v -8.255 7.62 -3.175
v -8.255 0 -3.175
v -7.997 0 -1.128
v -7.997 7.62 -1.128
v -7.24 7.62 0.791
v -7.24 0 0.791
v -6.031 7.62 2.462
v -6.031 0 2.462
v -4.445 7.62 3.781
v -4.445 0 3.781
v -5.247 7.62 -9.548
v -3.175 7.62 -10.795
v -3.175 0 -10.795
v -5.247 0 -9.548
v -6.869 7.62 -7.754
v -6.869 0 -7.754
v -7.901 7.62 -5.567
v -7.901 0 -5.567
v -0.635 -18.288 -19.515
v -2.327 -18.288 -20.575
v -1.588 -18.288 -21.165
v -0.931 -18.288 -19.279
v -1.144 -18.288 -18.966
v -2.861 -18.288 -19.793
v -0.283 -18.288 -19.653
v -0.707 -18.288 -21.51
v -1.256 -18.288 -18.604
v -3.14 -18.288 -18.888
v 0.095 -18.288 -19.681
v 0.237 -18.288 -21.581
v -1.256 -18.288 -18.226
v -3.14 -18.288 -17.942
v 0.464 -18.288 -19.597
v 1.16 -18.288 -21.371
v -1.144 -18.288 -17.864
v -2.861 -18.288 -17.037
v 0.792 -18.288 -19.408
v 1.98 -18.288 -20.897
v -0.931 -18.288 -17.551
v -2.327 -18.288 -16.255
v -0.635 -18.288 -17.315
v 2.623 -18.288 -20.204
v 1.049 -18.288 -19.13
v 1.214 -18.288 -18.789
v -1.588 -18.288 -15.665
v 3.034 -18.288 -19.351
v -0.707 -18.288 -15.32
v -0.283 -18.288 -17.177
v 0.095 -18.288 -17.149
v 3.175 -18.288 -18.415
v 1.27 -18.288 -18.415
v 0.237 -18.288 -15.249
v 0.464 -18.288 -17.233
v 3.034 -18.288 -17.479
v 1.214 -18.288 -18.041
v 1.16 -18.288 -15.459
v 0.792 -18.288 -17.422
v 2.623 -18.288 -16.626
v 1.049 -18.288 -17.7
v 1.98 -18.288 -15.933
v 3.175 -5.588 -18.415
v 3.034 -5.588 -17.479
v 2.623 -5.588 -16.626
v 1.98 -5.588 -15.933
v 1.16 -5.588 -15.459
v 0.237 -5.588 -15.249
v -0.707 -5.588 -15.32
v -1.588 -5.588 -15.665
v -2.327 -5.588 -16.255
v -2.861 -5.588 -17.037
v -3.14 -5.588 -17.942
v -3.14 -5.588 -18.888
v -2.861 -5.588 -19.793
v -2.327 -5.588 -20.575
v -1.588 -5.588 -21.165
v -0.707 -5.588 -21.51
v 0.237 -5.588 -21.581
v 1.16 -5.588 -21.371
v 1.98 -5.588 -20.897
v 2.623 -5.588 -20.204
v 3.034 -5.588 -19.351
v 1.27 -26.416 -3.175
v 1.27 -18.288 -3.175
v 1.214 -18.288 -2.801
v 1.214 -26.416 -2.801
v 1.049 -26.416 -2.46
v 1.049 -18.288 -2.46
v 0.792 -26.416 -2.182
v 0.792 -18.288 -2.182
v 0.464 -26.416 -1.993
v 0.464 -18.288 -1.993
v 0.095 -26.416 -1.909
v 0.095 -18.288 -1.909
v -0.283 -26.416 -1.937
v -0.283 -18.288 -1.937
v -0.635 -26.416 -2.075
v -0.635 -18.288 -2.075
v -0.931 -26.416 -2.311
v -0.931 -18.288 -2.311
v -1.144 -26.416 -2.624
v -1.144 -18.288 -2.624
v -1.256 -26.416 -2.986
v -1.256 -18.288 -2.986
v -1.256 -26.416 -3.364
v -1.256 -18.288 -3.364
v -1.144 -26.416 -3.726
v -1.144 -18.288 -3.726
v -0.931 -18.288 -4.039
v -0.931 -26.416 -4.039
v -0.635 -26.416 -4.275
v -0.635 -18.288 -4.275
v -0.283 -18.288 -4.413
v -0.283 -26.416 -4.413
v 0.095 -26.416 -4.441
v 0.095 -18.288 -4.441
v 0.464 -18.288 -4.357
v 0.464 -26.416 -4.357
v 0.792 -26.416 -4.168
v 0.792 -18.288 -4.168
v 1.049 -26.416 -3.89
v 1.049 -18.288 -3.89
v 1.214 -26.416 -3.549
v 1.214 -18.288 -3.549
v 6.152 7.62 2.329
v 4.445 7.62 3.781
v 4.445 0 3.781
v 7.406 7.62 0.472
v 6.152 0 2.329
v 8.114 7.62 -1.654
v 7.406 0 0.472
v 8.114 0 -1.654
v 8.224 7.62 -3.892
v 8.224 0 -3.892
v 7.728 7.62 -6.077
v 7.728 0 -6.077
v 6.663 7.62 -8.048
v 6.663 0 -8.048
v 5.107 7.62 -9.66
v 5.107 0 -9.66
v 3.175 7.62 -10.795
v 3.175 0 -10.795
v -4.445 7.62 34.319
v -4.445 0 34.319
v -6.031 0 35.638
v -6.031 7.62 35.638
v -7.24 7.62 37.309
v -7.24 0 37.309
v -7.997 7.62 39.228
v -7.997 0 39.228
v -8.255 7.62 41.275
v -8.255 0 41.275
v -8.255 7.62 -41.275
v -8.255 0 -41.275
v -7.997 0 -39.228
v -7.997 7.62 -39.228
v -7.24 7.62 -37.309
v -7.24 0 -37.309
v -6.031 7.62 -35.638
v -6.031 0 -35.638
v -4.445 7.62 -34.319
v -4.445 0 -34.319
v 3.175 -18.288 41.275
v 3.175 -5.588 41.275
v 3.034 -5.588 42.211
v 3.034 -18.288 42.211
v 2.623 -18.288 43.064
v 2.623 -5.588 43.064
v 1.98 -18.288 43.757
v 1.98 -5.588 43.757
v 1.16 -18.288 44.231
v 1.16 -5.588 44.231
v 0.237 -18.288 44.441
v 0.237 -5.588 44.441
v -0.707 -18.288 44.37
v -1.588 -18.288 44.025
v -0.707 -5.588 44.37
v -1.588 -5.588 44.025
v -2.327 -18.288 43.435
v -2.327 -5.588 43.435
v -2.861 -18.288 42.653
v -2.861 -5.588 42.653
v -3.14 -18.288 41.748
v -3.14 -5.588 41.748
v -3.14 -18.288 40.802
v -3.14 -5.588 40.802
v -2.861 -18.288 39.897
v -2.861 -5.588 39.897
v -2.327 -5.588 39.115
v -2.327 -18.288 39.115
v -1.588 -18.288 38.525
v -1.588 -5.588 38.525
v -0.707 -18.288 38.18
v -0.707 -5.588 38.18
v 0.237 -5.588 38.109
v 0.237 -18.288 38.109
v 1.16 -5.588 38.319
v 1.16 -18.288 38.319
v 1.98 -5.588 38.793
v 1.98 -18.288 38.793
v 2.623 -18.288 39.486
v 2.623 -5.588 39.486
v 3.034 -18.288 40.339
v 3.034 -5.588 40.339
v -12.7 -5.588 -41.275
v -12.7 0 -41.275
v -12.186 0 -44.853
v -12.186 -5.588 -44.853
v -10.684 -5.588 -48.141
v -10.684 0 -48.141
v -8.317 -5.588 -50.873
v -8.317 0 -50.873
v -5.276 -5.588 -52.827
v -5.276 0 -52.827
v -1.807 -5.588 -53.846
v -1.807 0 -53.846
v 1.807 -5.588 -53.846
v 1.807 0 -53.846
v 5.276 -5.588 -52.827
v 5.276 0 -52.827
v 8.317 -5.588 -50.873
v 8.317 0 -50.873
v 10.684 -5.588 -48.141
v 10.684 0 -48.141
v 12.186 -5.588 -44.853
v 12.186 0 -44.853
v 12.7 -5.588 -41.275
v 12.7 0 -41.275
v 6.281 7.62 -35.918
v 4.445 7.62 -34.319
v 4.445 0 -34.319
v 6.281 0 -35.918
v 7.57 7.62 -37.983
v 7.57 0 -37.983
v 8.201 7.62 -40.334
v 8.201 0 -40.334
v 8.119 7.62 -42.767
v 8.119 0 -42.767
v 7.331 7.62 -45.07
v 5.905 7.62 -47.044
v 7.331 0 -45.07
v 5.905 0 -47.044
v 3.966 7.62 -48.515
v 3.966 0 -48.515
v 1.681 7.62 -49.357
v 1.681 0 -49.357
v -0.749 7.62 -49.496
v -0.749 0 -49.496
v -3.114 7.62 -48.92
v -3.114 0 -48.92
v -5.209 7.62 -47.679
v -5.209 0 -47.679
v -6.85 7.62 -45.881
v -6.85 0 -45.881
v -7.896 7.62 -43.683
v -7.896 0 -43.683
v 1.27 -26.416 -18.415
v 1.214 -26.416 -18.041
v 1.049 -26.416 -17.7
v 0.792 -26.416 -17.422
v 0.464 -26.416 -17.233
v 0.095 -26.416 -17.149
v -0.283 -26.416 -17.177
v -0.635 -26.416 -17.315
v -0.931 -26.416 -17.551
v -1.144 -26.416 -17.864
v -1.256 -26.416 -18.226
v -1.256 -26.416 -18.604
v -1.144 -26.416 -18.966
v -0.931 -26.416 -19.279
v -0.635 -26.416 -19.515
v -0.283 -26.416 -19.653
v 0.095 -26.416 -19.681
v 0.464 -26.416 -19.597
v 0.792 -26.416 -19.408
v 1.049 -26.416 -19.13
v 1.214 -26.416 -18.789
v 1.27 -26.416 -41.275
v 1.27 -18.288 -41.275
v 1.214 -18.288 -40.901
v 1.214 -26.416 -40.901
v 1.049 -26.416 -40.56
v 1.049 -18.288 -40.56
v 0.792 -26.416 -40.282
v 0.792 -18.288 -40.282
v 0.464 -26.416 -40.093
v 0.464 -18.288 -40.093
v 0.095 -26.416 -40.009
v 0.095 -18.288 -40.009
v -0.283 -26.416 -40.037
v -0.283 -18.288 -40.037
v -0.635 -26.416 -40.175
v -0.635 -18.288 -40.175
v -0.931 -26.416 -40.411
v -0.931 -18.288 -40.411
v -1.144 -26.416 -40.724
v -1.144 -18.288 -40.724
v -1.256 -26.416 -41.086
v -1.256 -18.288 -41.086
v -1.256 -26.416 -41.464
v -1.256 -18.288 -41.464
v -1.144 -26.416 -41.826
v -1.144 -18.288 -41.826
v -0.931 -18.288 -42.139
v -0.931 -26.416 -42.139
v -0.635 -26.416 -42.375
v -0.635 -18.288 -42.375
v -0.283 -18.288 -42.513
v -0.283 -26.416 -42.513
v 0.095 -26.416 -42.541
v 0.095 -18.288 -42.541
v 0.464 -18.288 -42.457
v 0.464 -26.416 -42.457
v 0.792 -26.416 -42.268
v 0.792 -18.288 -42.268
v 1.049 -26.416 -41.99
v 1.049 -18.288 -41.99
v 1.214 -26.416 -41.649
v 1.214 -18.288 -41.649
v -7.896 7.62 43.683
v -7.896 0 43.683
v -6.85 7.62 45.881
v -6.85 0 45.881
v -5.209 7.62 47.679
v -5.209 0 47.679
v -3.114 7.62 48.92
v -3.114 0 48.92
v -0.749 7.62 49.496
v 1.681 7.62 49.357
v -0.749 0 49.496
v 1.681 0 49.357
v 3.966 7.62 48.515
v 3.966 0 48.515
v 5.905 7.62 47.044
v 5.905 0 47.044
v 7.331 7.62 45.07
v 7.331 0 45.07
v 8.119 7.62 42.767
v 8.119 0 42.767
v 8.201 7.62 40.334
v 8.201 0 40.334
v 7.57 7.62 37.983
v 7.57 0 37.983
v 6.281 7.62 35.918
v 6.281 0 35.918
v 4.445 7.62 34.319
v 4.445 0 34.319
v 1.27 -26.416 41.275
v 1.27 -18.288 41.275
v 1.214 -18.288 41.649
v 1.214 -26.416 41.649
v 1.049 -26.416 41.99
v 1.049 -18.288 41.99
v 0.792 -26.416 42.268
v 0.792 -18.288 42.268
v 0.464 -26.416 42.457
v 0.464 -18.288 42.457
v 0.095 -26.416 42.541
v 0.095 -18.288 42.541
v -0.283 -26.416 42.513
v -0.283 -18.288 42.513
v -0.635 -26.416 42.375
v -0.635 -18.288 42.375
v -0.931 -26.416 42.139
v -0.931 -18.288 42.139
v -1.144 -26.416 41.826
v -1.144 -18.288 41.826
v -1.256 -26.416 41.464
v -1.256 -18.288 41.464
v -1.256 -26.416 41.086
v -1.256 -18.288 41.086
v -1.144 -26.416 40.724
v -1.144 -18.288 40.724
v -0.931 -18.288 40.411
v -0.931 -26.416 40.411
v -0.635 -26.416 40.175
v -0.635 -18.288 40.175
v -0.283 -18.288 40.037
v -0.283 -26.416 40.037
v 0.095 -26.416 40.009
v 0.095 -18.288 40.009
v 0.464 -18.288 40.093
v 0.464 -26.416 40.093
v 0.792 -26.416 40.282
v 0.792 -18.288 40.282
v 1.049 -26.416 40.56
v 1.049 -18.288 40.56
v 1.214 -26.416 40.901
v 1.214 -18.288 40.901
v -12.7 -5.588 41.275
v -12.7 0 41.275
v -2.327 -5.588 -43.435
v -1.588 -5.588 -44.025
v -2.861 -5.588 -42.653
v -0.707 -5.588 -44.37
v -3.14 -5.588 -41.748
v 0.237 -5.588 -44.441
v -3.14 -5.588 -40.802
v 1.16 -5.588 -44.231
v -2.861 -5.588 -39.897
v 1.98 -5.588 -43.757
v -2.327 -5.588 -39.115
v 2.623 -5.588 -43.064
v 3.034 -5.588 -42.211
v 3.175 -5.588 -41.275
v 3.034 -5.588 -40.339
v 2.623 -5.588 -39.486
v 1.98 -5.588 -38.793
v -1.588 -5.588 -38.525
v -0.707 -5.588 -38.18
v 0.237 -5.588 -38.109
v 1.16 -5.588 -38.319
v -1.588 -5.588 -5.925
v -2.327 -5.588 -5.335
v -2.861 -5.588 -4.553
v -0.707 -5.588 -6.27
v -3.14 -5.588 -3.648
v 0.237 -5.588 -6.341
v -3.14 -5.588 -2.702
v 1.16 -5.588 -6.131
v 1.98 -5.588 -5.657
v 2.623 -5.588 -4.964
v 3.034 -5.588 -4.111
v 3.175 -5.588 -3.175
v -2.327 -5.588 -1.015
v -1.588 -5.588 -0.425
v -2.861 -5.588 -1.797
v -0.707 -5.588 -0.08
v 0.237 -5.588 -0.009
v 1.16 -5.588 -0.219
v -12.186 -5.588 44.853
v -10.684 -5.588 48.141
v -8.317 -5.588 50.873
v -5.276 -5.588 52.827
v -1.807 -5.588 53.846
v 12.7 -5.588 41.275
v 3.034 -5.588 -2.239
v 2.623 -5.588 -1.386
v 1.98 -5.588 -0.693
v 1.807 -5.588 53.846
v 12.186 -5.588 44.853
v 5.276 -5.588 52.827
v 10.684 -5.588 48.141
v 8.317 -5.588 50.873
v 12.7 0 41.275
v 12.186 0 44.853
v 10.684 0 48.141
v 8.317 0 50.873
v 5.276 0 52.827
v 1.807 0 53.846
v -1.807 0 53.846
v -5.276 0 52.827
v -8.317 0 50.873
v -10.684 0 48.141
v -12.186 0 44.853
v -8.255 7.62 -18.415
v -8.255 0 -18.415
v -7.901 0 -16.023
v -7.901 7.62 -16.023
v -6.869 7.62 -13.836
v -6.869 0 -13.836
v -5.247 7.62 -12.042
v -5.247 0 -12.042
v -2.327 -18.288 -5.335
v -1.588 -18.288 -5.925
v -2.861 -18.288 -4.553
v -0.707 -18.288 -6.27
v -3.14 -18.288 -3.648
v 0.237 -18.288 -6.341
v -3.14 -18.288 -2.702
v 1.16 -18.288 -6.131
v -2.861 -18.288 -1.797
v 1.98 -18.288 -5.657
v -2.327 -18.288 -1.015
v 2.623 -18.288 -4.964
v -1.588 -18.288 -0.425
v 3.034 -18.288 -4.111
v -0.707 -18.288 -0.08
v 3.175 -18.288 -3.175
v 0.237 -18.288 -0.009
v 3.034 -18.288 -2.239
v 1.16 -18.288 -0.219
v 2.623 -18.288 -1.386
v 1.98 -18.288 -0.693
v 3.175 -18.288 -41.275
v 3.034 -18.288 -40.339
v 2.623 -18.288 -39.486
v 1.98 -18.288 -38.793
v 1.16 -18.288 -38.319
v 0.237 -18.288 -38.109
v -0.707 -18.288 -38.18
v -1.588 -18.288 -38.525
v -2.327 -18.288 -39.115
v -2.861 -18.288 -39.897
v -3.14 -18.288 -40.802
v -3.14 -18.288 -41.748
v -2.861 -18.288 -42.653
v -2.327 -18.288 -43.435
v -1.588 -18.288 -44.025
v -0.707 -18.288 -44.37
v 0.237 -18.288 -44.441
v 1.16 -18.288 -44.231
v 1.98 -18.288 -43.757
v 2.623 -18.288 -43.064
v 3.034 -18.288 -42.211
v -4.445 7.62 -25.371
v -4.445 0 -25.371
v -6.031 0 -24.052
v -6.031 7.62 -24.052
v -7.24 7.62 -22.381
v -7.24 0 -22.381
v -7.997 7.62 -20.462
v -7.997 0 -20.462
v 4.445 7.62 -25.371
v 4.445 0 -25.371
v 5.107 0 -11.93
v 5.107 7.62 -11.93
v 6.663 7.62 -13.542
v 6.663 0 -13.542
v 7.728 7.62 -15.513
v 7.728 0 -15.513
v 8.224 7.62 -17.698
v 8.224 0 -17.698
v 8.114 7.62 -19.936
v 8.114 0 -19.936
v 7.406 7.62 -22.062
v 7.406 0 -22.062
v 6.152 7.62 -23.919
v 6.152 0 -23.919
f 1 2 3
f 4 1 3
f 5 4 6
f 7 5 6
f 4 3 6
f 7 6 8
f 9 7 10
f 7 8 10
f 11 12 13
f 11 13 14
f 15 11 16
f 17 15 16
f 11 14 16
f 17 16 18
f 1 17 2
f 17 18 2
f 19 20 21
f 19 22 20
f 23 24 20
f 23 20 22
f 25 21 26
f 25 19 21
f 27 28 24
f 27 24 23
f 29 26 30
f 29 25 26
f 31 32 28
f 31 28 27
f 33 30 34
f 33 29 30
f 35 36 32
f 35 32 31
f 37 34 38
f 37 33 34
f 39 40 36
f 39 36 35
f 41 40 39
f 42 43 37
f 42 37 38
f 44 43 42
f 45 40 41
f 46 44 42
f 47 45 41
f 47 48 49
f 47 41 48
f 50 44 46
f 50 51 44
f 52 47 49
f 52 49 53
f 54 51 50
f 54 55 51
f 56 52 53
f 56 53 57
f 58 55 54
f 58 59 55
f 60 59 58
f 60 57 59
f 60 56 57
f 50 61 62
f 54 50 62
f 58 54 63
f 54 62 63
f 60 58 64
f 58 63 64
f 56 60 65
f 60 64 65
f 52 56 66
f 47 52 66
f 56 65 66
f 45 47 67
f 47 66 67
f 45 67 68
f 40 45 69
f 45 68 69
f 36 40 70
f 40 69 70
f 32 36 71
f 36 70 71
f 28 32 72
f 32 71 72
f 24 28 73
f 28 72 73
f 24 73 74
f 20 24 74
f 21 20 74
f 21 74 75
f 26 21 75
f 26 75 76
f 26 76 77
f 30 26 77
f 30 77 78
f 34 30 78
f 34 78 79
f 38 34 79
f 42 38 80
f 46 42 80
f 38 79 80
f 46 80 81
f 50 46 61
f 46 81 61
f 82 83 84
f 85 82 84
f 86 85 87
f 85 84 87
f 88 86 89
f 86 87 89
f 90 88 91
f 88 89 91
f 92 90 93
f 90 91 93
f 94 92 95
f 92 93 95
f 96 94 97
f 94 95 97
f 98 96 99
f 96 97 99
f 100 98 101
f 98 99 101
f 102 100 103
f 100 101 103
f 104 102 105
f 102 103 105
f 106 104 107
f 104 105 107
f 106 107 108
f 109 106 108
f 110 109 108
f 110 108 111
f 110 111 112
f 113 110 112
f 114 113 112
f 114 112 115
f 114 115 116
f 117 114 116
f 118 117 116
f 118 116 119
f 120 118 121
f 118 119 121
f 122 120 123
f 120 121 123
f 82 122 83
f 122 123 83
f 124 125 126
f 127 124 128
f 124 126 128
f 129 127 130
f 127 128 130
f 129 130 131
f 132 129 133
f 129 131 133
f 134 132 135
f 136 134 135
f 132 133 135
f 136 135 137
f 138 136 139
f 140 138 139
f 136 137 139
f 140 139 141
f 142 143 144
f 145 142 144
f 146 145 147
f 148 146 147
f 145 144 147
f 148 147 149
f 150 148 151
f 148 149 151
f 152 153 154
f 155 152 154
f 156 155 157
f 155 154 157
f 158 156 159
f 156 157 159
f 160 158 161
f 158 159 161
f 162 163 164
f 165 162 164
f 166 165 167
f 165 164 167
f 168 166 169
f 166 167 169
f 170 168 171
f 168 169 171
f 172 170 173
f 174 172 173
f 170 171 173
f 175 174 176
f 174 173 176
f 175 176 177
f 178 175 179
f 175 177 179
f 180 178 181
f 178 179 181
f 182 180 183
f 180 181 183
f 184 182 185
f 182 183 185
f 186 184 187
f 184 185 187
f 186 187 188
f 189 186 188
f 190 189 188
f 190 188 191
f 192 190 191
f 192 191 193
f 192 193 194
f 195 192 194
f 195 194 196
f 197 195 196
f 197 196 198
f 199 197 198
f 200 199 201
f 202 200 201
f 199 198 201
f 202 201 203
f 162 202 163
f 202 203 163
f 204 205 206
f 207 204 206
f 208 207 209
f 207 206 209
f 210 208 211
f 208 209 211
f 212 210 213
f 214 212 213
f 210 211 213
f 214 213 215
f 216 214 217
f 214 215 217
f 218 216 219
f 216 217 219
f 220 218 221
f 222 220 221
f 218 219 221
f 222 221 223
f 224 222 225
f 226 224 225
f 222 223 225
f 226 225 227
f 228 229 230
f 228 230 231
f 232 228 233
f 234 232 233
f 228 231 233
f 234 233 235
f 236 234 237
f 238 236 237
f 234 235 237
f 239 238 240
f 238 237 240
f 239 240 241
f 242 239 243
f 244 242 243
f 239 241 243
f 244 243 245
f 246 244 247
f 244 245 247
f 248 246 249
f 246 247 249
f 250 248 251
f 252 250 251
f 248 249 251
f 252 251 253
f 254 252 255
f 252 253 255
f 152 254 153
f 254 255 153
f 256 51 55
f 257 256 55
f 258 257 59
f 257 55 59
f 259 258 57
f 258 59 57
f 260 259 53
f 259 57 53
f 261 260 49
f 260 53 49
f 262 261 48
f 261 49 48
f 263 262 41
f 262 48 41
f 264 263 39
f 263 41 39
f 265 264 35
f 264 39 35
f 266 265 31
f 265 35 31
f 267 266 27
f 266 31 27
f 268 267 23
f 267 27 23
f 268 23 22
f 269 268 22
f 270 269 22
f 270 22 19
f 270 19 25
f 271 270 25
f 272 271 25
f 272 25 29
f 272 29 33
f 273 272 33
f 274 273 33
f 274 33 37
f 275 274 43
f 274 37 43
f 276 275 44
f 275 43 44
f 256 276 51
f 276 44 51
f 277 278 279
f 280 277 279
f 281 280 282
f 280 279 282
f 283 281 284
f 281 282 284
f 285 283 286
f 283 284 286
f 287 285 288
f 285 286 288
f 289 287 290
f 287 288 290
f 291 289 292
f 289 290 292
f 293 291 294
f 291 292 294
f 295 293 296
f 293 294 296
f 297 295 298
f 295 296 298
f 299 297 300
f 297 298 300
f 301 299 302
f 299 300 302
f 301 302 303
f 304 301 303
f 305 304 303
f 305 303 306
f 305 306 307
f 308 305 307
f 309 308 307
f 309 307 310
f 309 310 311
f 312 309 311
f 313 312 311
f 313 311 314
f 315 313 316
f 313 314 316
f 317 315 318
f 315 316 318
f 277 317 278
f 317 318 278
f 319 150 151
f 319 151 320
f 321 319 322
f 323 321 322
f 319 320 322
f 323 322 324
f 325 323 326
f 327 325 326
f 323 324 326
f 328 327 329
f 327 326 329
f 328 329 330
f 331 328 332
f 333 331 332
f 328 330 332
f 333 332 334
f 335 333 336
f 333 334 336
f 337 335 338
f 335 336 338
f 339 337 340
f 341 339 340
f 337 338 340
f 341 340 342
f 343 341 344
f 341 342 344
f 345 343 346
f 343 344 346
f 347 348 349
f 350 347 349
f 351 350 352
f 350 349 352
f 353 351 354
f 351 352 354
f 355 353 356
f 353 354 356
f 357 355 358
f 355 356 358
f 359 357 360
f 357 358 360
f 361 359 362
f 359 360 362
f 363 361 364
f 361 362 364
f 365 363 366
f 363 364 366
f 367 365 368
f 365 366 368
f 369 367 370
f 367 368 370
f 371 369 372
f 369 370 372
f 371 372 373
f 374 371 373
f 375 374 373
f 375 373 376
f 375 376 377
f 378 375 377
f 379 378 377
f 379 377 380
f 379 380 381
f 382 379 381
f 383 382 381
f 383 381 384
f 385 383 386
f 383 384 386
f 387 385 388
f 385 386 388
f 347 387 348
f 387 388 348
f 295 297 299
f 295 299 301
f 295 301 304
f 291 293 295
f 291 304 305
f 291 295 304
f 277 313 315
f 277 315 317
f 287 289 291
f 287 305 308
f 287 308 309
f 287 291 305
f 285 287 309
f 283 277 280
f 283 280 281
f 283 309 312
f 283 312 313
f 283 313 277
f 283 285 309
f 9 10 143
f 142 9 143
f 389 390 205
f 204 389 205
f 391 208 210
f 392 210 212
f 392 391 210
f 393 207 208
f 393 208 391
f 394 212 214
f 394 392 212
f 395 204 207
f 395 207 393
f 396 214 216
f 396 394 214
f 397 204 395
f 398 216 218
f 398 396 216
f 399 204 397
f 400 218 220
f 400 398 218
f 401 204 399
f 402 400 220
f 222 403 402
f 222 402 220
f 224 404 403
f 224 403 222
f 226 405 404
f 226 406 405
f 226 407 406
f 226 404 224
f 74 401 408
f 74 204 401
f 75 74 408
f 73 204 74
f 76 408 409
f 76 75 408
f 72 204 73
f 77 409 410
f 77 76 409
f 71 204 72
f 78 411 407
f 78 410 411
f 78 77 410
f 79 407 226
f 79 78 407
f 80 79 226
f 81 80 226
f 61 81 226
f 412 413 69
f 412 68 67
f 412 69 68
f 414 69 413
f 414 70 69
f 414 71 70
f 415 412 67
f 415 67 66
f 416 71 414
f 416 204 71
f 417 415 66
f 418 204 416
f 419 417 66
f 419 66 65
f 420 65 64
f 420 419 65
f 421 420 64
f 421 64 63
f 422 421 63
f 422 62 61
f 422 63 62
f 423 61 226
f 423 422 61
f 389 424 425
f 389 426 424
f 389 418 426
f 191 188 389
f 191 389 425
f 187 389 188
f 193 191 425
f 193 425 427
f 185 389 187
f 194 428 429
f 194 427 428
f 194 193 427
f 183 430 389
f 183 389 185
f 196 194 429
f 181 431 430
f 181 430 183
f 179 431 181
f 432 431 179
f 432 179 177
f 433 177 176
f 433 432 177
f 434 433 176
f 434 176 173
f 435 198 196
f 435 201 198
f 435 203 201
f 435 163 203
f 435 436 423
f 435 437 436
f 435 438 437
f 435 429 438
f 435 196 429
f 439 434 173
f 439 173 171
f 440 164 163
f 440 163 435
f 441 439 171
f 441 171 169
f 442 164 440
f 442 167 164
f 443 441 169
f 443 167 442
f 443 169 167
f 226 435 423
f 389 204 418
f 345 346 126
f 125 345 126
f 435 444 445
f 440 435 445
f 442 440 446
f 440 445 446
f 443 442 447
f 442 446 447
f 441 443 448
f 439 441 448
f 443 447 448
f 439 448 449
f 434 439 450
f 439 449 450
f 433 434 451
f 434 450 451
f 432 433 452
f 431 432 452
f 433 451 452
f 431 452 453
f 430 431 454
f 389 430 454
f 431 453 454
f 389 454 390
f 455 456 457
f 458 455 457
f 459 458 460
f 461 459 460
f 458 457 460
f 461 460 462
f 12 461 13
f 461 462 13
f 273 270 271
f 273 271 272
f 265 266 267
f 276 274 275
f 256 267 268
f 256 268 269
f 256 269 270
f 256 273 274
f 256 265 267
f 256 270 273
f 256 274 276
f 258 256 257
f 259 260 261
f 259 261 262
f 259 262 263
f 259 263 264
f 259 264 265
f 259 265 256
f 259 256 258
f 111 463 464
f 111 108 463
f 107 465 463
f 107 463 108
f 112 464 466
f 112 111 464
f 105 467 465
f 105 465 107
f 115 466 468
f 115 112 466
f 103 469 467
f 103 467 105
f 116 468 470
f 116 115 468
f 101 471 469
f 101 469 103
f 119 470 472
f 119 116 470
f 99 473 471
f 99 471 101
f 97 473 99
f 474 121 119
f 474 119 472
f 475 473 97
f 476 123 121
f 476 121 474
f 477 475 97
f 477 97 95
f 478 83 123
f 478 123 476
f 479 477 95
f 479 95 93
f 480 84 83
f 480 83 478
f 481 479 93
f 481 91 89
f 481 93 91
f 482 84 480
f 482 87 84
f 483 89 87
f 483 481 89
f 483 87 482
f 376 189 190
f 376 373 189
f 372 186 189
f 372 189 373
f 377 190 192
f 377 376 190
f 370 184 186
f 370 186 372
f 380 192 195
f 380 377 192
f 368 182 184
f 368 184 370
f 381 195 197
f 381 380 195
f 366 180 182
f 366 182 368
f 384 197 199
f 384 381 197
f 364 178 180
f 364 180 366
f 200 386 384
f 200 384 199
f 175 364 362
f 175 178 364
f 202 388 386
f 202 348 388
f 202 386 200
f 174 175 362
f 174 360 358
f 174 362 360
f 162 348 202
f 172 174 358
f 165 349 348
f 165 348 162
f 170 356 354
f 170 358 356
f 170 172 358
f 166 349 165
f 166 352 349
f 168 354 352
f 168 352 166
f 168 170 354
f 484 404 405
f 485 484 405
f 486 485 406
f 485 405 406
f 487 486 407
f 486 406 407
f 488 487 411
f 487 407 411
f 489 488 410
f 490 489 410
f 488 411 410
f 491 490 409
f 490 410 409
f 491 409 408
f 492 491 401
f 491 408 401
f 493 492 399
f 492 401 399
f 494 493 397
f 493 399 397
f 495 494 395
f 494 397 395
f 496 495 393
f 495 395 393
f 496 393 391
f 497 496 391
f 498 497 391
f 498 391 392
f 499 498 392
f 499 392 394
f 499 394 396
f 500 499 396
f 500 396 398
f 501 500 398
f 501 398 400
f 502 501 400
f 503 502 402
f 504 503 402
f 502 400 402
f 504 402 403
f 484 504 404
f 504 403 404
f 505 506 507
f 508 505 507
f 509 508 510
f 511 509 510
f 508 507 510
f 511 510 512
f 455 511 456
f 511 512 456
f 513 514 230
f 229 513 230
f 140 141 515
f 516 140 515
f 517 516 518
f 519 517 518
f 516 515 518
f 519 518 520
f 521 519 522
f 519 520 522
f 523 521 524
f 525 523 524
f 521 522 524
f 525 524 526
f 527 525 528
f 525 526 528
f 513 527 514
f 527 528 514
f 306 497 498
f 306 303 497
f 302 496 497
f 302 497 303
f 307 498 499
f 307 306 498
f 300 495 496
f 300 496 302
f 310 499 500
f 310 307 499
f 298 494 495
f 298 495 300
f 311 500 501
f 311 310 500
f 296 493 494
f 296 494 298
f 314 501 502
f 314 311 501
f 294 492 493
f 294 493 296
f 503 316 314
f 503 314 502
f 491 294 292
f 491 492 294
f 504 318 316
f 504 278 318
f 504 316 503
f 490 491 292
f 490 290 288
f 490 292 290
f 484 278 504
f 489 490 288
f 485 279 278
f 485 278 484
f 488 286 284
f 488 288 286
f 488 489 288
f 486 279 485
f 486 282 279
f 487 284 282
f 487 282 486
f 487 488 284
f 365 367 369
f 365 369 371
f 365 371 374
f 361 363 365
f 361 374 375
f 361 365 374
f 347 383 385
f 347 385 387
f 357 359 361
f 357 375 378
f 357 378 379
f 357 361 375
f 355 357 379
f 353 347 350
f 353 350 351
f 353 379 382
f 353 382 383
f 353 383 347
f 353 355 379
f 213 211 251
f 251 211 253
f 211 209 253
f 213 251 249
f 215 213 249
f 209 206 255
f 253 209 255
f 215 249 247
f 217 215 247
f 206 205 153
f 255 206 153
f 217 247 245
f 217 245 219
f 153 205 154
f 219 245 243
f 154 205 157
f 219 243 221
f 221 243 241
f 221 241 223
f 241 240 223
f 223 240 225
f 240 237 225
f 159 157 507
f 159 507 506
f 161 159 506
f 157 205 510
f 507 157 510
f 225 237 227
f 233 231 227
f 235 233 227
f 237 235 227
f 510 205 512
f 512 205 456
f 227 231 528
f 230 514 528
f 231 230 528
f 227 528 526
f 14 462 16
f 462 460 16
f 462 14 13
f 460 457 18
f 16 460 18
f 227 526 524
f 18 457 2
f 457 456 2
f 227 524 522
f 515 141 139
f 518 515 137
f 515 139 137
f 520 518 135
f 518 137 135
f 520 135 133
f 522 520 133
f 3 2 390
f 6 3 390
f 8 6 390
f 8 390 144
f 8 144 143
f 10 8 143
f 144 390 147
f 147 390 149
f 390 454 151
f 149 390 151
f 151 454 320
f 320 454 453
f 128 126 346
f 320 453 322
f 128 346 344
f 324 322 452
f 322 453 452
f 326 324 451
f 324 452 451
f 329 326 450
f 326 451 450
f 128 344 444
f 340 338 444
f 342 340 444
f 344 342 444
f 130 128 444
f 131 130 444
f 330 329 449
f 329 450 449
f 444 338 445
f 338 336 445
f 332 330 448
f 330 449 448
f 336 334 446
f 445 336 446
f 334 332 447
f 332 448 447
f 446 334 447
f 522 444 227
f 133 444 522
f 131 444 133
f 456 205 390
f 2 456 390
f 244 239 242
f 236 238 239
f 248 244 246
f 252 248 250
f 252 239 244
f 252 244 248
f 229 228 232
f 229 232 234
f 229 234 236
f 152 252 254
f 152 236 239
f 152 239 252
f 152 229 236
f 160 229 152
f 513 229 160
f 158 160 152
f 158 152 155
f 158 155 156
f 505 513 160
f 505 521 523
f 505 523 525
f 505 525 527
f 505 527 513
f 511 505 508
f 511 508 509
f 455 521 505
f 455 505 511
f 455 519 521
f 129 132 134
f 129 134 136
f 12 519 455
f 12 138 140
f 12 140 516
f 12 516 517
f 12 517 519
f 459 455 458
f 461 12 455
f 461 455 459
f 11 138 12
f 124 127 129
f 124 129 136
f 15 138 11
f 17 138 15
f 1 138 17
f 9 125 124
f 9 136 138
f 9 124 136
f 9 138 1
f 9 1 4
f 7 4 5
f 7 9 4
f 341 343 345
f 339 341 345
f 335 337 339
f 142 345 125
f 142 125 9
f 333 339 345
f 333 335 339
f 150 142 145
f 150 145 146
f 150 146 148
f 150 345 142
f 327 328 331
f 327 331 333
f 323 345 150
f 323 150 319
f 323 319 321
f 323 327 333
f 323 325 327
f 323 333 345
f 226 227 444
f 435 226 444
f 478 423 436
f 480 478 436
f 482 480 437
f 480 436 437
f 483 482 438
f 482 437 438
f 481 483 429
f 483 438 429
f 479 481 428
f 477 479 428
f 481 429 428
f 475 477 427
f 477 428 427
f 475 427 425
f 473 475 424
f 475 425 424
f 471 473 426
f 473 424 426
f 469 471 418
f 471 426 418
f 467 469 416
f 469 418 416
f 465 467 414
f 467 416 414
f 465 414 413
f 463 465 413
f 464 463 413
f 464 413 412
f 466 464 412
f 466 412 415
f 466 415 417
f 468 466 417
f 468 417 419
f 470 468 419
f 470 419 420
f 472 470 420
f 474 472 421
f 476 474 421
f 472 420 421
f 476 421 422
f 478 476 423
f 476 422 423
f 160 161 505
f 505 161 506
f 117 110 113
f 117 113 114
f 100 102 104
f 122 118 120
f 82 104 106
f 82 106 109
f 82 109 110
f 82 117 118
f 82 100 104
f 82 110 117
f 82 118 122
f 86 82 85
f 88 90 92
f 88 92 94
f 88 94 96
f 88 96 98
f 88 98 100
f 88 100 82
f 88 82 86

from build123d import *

# Parameters (mm, degrees)
F1_DEPTH = 5.588
F3_DEPTH = 7.62
F4_R     = 3.175
F5_DEPTH = 12.7
F6_R     = 1.27
F7_DEPTH = 8.128


with BuildPart() as f1:
    # F0 (on Front) → F1 (new body)
    with BuildSketch(Plane.XZ):
        with BuildLine():
            Line((12.7, -41.275), (12.7, 41.275))
            ThreePointArc((12.7, 41.275), (0, 53.975), (-12.7, 41.275))
            Line((-12.7, 41.275), (-12.7, -41.275))
            ThreePointArc((-12.7, -41.275), (0, -53.975), (12.7, -41.275))
        make_face()
    extrude(amount=F1_DEPTH)

    # F2 (on face) → F3 (join)
    with BuildSketch(Plane(origin=(0, 0, 0), x_dir=(-1, 0, 0), z_dir=(0, 1, 0))):
        with BuildLine():
            ThreePointArc((4.445, 34.3189235197), (7.2401139494, 37.309426271), (8.255, 41.275))
            ThreePointArc((8.255, 41.275), (-3.965573729, 48.5151139494), (-4.445, 34.3189235197))
            ThreePointArc((-4.445, 34.3189235197), (0, 33.02), (4.445, 34.3189235197))
        make_face()
        with BuildLine():
            ThreePointArc((4.445, 34.3189235197), (0, 33.02), (-4.445, 34.3189235197))
            Line((-4.445, 34.3189235197), (-4.445, 3.7810764803))
            ThreePointArc((-4.445, 3.7810764803), (0, 5.08), (4.445, 3.7810764803))
            Line((4.445, 3.7810764803), (4.445, 34.3189235197))
        make_face()
        with BuildLine():
            ThreePointArc((4.445, 3.7810764803), (0, 5.08), (-4.445, 3.7810764803))
            ThreePointArc((-4.445, 3.7810764803), (-8.2238434682, -3.89153584), (-3.175, -10.795))
            ThreePointArc((-3.175, -10.795), (0, -10.16), (3.175, -10.795))
            ThreePointArc((3.175, -10.795), (6.8685751798, -7.7540501198), (8.255, -3.175))
            ThreePointArc((8.255, -3.175), (7.2401139494, 0.790573729), (4.445, 3.7810764803))
        make_face()
        with BuildLine():
            ThreePointArc((3.175, -10.795), (0, -11.43), (-3.175, -10.795))
            ThreePointArc((-3.175, -10.795), (-8.2238434682, -17.69846416), (-4.445, -25.3710764803))
            ThreePointArc((-4.445, -25.3710764803), (0, -26.67), (4.445, -25.3710764803))
            ThreePointArc((4.445, -25.3710764803), (7.2401139494, -22.380573729), (8.255, -18.415))
            ThreePointArc((8.255, -18.415), (6.8685751798, -13.8359498802), (3.175, -10.795))
        make_face()
        with BuildLine():
            ThreePointArc((3.175, -10.795), (0, -10.16), (-3.175, -10.795))
            ThreePointArc((-3.175, -10.795), (0, -11.43), (3.175, -10.795))
        make_face()
        with BuildLine():
            ThreePointArc((4.445, -25.3710764803), (0, -26.67), (-4.445, -25.3710764803))
            Line((-4.445, -25.3710764803), (-4.445, -34.3189235197))
            ThreePointArc((-4.445, -34.3189235197), (0, -33.02), (4.445, -34.3189235197))
            Line((4.445, -34.3189235197), (4.445, -25.3710764803))
        make_face()
        with BuildLine():
            ThreePointArc((4.445, -34.3189235197), (0, -33.02), (-4.445, -34.3189235197))
            ThreePointArc((-4.445, -34.3189235197), (-3.965573729, -48.5151139494), (8.255, -41.275))
            ThreePointArc((8.255, -41.275), (7.2401139494, -37.309426271), (4.445, -34.3189235197))
        make_face()
    extrude(amount=F3_DEPTH)

    # F4 (on face) → F5 (join)
    with BuildSketch(Plane.XZ.offset(5.588)):
        with Locations((0, -41.275)):
            Circle(F4_R)
        with Locations((0, 41.275)):
            Circle(F4_R)
        with Locations((0, -3.175)):
            Circle(F4_R)
        with Locations((0, -18.415)):
            Circle(F4_R)
    extrude(amount=F5_DEPTH)

    # F6 (on face) → F7 (join)
    with BuildSketch(Plane.XZ.offset(18.288)):
        with Locations((0, 41.275)):
            Circle(F6_R)
        with Locations((0, -3.175)):
            Circle(F6_R)
        with Locations((0, -18.415)):
            Circle(F6_R)
        with Locations((0, -41.275)):
            Circle(F6_R)
    extrude(amount=F7_DEPTH)


solid = f1.part
